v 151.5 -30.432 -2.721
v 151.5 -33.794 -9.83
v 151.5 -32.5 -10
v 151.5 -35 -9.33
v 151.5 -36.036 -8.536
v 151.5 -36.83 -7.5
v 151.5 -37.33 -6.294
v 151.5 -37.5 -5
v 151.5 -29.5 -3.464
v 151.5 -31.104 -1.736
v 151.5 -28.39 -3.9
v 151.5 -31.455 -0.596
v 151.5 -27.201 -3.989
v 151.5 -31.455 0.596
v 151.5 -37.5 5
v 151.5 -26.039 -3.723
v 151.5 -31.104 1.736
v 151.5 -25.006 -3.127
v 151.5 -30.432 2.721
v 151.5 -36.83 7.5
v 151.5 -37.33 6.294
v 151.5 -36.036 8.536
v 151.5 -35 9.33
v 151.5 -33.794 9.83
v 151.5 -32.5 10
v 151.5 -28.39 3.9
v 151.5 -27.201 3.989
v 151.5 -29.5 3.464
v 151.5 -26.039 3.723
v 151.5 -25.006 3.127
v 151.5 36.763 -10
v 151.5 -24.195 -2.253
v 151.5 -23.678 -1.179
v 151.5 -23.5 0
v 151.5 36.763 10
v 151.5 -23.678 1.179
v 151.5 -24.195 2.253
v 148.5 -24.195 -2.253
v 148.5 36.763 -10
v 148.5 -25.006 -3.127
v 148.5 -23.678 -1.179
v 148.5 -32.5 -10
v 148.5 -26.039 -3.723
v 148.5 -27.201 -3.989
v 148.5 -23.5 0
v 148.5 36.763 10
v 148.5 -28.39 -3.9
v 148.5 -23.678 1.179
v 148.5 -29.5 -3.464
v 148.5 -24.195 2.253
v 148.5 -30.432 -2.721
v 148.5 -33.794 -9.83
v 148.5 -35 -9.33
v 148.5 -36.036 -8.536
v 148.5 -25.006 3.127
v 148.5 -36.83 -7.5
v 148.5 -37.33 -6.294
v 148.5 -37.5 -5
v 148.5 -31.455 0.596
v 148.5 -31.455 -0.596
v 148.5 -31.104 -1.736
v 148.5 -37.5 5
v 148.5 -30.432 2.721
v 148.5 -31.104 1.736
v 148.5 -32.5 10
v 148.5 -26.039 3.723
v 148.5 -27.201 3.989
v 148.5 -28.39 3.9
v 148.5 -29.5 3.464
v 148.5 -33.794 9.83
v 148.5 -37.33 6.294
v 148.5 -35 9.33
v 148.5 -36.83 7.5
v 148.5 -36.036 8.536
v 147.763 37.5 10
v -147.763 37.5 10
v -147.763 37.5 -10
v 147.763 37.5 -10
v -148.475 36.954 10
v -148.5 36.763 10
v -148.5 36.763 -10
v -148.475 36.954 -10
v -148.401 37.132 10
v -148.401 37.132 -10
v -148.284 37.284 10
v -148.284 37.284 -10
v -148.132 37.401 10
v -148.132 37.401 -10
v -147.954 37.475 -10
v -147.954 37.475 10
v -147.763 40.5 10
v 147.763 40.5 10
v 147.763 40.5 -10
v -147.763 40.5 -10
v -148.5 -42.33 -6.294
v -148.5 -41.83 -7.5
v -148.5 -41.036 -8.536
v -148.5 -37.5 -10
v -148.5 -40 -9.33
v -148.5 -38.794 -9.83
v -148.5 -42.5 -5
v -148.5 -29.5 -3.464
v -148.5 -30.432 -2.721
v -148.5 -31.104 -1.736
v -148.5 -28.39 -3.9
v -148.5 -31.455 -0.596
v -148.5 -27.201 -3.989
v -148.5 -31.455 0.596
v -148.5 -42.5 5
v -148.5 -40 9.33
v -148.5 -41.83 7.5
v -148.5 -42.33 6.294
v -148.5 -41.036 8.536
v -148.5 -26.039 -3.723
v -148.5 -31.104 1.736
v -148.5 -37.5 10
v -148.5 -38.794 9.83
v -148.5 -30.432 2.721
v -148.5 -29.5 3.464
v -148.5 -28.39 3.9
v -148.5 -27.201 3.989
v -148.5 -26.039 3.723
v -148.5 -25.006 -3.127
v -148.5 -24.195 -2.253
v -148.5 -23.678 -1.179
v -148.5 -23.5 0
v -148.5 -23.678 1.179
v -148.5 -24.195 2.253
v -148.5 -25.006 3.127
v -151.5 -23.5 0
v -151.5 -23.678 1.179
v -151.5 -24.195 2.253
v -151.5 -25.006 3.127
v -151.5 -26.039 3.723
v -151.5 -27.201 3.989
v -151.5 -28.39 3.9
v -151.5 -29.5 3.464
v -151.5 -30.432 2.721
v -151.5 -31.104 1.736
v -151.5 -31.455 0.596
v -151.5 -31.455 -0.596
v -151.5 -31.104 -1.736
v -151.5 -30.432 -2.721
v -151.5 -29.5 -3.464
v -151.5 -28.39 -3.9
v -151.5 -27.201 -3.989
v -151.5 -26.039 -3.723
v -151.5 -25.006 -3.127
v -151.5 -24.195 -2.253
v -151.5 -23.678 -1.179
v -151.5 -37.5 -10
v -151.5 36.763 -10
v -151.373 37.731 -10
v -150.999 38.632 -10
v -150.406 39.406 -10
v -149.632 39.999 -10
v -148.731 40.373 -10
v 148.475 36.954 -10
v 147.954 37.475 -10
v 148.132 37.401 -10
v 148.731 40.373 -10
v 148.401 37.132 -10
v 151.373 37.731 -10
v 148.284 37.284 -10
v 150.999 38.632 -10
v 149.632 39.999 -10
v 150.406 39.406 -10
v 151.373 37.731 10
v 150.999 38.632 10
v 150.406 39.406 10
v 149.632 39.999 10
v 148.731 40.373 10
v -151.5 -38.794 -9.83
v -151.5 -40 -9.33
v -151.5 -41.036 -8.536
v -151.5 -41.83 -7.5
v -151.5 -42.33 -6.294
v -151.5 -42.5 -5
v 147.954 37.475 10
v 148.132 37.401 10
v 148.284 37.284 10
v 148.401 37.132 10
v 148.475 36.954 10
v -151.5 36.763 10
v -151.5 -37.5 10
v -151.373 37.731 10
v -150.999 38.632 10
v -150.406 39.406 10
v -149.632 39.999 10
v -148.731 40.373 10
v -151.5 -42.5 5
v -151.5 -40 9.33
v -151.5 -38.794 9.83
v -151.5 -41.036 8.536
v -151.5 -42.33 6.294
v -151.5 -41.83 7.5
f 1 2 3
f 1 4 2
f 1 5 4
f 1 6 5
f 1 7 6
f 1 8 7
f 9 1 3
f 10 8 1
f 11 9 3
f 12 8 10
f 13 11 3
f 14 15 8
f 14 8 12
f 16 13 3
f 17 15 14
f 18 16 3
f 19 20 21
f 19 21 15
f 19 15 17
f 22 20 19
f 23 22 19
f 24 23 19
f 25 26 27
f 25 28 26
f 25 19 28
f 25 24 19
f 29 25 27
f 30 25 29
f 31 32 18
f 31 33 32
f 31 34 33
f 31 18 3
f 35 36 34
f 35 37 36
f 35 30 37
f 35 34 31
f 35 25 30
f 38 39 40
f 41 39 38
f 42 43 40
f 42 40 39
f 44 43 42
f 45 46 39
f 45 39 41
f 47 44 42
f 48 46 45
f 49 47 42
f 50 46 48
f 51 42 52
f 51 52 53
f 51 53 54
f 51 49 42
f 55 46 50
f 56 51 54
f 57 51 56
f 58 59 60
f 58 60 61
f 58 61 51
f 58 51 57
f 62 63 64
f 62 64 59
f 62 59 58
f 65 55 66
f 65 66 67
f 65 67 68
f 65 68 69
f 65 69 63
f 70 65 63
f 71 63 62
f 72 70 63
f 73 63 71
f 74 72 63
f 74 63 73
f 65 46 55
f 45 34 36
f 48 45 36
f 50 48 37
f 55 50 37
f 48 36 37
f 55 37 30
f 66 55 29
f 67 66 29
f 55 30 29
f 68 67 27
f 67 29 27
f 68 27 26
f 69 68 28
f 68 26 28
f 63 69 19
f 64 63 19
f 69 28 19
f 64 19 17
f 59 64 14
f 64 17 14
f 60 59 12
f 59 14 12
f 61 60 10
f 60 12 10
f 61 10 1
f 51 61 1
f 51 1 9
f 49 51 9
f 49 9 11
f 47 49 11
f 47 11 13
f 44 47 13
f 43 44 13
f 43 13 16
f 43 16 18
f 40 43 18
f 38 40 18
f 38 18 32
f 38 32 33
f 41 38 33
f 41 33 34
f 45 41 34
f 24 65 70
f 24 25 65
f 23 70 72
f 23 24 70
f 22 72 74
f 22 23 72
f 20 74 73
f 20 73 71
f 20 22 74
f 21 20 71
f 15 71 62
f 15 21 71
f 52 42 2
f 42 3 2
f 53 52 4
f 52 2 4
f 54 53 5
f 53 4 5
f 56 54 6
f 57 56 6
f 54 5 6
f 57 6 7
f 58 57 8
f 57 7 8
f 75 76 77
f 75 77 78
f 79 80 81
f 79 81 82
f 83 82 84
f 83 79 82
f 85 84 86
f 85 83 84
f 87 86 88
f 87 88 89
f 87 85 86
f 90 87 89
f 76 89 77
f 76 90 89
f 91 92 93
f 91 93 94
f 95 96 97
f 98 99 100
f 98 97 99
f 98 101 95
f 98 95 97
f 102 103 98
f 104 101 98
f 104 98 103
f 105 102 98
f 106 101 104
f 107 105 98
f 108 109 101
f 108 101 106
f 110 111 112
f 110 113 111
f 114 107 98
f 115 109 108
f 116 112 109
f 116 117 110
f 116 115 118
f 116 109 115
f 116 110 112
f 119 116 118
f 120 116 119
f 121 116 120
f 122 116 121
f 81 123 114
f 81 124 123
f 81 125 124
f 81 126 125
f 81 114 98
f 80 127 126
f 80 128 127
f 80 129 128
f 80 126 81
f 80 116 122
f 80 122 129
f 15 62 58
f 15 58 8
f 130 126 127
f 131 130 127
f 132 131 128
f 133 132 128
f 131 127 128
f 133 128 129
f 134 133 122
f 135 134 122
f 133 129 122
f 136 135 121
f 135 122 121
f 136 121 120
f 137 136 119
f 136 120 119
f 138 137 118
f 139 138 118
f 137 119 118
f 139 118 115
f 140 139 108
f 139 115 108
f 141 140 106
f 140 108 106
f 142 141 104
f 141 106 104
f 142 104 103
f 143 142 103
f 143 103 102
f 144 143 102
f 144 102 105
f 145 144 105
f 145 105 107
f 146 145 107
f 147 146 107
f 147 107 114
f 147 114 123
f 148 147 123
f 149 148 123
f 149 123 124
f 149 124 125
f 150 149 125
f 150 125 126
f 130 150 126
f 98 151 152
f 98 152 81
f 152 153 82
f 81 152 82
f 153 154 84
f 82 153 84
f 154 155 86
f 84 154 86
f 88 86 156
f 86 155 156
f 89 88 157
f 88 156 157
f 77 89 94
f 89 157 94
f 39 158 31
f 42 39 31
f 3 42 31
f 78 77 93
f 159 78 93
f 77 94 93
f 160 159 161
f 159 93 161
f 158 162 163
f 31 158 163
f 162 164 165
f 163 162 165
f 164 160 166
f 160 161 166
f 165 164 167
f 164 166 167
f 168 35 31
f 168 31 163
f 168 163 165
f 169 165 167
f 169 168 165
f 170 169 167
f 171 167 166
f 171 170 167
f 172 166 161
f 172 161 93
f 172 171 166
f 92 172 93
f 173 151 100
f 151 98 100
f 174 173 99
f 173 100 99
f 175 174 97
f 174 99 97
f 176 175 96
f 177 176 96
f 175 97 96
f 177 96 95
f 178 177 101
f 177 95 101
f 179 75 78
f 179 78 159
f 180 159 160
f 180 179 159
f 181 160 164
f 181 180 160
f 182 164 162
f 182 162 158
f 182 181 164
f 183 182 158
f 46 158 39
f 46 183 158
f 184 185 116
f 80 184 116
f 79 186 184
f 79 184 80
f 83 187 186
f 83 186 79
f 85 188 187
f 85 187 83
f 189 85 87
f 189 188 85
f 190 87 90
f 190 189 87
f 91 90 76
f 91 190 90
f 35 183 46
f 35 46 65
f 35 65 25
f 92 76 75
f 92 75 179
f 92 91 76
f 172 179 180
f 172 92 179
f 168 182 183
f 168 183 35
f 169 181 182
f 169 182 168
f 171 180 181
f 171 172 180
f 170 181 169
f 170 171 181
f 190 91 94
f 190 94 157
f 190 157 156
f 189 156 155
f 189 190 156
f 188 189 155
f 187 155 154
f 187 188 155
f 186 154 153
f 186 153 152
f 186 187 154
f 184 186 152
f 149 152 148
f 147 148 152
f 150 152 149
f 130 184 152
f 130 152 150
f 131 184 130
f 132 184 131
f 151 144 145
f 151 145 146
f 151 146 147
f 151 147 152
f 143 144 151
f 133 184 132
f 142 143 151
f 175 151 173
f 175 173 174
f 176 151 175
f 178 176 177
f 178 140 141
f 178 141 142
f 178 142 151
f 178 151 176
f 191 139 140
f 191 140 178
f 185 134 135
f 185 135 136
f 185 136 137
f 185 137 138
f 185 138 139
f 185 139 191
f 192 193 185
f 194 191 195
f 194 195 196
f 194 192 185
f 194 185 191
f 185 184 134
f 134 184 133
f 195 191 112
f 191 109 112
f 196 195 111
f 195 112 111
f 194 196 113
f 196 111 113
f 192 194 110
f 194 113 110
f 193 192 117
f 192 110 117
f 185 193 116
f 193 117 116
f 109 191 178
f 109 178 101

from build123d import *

# Parameters (mm, degrees)
BASE_FLANGE1_DEPTH = 10
SKETCH3_R          = 4
CUT_EXTRUDE1_DEPTH = 307.129466076
FILLET1_R          = 5


# Sheet-metal steps are written as plain solids
with BuildPart() as part:
    # Sketch1 → Base-Flange1 (new, symmetric)
    with BuildSketch(Plane.XY):
        with BuildLine():
            Line((-148.5, -42.5), (-148.5, 36.7634))
            ThreePointArc((-148.5, 36.7634), (-148.284254855, 37.284254855), (-147.7634, 37.5))
            Line((-147.7634, 37.5), (147.7634, 37.5))
            ThreePointArc((147.7634, 37.5), (148.284254855, 37.284254855), (148.5, 36.7634))
            Line((148.5, 36.7634), (148.5, -37.5))
            Line((148.5, -37.5), (151.5, -37.5))
            Line((151.5, -37.5), (151.5, 36.7634))
            ThreePointArc((151.5, 36.7634), (150.405575199, 39.405575199), (147.7634, 40.5))
            Line((147.7634, 40.5), (-147.7634, 40.5))
            ThreePointArc((-147.7634, 40.5), (-150.405575199, 39.405575199), (-151.5, 36.7634))
            Line((-151.5, 36.7634), (-151.5, -42.5))
            Line((-151.5, -42.5), (-148.5, -42.5))
        make_face()
    extrude(amount=BASE_FLANGE1_DEPTH, both=True)

    # Sketch3 → Cut-Extrude1 (cut, through all)
    with BuildSketch(Plane(origin=(151.5, 0, 0), x_dir=(0, 0, -1), z_dir=(1, 0, 0))):
        with Locations(Location((0, -27.5, 0), (0, 0, 90))):
            Circle(SKETCH3_R)
    extrude(amount=-CUT_EXTRUDE1_DEPTH, mode=Mode.SUBTRACT)

    # Fillet1
    fillet1_edges = [part.edges().sort_by_distance(p)[0] for p in [
        (150, -37.5, -10),
        (150, -37.5, 10),
        (-150, -42.5, -10),
        (-150, -42.5, 10),
    ]]
    fillet(fillet1_edges, radius=FILLET1_R)


solid = part.part
